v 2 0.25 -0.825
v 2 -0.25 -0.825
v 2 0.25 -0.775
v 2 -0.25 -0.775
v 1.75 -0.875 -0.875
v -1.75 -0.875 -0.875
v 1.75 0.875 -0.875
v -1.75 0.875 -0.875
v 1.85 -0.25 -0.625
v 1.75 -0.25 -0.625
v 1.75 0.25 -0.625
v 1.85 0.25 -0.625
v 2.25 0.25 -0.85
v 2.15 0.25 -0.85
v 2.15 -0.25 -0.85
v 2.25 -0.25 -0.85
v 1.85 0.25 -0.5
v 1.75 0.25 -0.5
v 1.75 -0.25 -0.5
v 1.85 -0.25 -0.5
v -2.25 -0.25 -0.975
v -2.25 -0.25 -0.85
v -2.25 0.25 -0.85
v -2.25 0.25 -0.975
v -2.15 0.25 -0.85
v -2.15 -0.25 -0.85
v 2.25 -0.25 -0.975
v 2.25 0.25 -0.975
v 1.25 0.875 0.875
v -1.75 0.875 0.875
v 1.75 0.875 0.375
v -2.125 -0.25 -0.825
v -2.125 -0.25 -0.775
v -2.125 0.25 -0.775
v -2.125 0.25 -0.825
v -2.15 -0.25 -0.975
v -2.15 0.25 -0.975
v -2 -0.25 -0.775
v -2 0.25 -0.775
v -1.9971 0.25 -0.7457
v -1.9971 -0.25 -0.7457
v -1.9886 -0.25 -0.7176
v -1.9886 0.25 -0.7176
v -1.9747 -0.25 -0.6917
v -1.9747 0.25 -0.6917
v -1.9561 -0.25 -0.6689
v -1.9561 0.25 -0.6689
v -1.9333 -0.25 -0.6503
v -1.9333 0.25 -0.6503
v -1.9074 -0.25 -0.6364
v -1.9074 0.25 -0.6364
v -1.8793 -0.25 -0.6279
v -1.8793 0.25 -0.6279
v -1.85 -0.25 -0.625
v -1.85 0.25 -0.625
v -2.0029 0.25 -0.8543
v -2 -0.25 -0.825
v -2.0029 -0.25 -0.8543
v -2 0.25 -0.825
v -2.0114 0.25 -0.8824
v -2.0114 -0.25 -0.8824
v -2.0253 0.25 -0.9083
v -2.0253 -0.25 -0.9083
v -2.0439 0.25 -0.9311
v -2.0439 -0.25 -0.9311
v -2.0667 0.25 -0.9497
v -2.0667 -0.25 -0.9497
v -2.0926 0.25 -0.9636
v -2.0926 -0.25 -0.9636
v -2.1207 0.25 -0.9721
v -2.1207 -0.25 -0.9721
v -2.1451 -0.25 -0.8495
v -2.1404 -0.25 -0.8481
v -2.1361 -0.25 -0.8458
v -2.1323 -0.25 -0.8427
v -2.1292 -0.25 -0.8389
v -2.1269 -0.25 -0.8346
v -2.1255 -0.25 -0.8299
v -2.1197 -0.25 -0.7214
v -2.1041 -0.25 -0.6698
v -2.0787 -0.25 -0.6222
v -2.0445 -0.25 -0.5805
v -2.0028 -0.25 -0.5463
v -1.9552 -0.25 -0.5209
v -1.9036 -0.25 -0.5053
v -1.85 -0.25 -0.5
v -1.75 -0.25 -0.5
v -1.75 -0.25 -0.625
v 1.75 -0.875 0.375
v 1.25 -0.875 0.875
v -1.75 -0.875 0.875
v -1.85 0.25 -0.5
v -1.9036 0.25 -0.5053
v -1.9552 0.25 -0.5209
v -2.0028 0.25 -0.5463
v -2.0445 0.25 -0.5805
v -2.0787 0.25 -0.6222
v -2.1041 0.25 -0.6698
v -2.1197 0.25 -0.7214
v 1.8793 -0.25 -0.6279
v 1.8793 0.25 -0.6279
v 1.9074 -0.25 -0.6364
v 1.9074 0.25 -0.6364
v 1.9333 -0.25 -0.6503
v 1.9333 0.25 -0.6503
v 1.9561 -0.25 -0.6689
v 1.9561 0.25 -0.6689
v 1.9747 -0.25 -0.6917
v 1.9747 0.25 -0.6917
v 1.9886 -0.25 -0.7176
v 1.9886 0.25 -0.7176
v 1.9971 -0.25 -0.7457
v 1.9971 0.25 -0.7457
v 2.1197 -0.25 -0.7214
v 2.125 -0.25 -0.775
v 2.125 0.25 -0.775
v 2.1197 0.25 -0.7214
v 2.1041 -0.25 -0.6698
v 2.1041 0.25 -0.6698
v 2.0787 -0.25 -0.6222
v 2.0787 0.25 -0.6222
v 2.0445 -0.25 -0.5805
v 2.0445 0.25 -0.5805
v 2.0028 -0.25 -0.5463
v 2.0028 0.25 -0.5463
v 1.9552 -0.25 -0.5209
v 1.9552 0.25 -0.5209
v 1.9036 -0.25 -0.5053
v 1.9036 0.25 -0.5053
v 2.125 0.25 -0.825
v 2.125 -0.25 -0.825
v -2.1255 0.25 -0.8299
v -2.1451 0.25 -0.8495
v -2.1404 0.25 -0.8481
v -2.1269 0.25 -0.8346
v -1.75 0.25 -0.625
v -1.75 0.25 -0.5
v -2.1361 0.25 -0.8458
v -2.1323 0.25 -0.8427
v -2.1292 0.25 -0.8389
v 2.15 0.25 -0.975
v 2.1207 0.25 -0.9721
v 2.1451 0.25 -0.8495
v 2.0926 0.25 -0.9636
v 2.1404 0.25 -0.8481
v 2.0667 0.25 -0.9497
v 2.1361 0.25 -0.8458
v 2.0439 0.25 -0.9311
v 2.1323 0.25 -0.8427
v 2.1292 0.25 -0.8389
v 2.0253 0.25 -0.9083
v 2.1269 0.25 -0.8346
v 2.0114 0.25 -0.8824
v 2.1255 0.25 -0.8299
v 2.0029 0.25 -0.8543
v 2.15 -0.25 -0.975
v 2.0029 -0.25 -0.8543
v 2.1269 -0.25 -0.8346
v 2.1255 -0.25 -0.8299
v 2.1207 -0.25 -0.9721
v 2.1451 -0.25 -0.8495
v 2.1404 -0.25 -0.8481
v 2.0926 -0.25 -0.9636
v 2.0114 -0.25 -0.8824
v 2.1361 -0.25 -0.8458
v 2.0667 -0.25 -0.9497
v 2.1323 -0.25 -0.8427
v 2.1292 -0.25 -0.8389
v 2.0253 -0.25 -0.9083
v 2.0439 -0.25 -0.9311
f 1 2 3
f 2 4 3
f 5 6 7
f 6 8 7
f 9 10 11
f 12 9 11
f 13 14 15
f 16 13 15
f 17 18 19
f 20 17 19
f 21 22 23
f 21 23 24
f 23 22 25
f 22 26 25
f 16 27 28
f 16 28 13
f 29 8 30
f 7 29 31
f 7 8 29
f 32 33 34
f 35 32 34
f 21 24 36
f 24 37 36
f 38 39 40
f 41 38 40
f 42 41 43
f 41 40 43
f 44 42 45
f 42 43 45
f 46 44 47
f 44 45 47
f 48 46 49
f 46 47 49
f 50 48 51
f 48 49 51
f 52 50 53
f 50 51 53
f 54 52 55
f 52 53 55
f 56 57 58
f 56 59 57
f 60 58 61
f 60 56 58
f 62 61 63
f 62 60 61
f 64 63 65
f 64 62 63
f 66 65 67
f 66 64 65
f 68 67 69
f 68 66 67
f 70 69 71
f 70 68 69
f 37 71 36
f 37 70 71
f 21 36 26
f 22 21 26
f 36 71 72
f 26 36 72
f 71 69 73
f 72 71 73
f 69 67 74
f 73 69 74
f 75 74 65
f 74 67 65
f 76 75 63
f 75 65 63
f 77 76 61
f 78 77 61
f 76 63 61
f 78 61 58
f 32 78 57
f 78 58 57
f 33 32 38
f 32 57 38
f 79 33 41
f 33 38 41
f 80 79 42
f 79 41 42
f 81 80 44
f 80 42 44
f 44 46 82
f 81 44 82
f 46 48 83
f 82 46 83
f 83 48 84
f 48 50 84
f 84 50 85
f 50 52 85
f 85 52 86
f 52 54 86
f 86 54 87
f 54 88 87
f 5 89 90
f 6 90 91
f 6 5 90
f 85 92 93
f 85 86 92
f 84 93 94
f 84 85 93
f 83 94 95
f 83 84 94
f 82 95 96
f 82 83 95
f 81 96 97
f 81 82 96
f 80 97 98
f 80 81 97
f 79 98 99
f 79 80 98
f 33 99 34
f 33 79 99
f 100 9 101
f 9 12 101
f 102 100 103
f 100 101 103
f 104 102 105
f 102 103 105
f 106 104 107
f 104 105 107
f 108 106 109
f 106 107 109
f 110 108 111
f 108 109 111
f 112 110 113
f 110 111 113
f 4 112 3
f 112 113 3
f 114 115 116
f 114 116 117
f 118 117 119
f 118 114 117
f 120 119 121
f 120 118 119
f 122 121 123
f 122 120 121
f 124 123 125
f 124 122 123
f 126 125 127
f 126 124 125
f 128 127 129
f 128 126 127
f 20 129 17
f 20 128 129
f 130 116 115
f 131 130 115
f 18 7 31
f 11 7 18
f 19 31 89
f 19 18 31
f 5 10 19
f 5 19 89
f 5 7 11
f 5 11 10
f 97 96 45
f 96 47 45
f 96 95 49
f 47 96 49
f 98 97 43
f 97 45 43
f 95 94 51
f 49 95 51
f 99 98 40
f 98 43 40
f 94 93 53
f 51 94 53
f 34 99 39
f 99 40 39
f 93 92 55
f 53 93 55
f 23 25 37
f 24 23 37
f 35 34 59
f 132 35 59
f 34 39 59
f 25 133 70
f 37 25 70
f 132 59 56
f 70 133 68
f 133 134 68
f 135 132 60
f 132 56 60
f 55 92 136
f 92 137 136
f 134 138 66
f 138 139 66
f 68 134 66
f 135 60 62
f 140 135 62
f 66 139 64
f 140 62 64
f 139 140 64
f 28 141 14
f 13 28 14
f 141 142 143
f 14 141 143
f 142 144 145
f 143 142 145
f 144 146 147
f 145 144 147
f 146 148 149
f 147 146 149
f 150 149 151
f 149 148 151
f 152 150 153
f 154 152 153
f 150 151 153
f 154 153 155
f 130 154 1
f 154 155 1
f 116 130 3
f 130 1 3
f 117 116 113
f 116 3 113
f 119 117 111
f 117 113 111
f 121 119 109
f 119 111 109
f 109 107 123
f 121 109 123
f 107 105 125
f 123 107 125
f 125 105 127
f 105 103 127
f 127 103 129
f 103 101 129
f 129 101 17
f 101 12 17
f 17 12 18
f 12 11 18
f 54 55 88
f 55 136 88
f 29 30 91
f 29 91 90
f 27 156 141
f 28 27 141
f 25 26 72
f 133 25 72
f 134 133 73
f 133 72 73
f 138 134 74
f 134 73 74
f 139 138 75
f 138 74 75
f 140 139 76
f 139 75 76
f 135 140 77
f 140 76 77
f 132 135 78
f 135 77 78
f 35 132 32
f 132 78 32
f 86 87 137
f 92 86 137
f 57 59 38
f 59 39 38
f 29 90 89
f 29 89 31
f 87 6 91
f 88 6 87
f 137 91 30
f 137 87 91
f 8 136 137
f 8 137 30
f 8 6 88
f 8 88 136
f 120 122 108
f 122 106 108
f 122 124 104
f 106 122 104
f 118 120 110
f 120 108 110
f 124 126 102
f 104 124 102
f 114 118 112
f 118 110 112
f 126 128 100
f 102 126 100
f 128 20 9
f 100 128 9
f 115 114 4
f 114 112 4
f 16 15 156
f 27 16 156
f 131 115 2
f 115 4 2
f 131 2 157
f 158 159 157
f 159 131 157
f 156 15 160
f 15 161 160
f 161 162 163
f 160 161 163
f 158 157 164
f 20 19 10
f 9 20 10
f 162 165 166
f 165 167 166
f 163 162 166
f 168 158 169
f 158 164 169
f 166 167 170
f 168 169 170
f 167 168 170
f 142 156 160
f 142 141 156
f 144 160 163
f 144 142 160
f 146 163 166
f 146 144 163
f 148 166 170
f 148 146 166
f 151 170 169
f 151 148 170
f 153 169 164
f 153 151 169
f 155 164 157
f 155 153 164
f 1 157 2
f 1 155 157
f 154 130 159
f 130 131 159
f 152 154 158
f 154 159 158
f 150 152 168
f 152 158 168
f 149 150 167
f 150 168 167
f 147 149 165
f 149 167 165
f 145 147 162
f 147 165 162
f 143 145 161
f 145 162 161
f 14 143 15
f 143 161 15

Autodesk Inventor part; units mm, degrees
ref_plane "YZ Plane" through (0, 0, 0) normal (1, 0, 0) x (0, 1, 0)
ref_plane "XZ Plane" through (0, 0, 0) normal (0, 1, 0) x (-1, 0, 0)
sketch "Sketch1" plane through (0, 0, 0) normal (0, 0, 1) x (1, 0, 0)
  line L0 (-1.75, 0.875) -> (1.75, 0.875)
  line L1 (1.75, 0.875) -> (1.75, -0.875)
  line L2 (1.75, -0.875) -> (-1.75, -0.875)
  line L3 (-1.75, -0.875) -> (-1.75, 0.875)
  line L4 (0, 0) -> (0, 0.875) construction
  line L5 (0, 0) -> (-1.75, 0) construction
  line L6 (0, 0) -> (1.75, 0) construction
  line L7 (0, 0) -> (0, -0.875) construction
  dimension "d0" = 1.75
  dimension "d1" = 3.5
extrude "Extrusion1" add sketch "Sketch1" along normal mid plane 1.75
chamfer "Chamfer1" distance 0.5 angle 45 1 edges at (1.75, 0, 0.875)
sketch "Sketch2" plane through (1.75, -0.875, -0.875) normal (1, 0, 0) x (0, 0, -1)
  line L0 (-1.25, 0) -> (0, 0) projected
  line L1 (0, 0) -> (0, 1.75) projected
  line L2 (-1.25, 1.75) -> (0, 1.75) projected
  line L3 (-0.375, 1.125) -> (-0.25, 1.125)
  line L4 (-0.25, 1.125) -> (-0.25, 0.625)
  line L5 (-0.25, 0.625) -> (-0.375, 0.625)
  line L6 (-0.375, 0.625) -> (-0.375, 1.125)
  line L7 (-0.3125, 1.125) -> (-0.3125, 1.75) construction
  line L8 (-0.3125, 0.625) -> (-0.3125, 0) construction
  dimension "d6" = 0.25
  dimension "d7" = 0.5
  dimension "d8" = 0.125
ref_plane "Work Plane2" through (1.75, -0.25, -0.625) normal (0, 1, 0) x (0, 0, 1)
sketch "Sketch4" plane through (1.75, -0.25, -0.625) normal (0, 1, 0) x (0, 0, 1)
  line L0 (0, 0) -> (0.125, 0) projected
  line L1 (0, 0) -> (0, 0.1)
  line L2 (-0.15, 0.25) -> (-0.2, 0.25)
  line L3 (-0.35, 0.4) -> (-0.35, 0.5)
  arc A0 (0, 0.1) -> (-0.15, 0.25) centre (-0.15, 0.1) ccw
  arc A1 (-0.35, 0.4) -> (-0.2, 0.25) centre (-0.2, 0.4) ccw
  point P0 (0, 0.25)
  point P1 (-0.35, 0.25)
  dimension "d11" = 0.25
  dimension "d12" = 0.25
  dimension "d13" = 0.35
  dimension "d14" = 0.15
sweep "Sweep1" add profiles "Sketch2" path "Sketch4"
mirror "Mirror1" about plane through (0, 0, 0) normal (1, 0, 0) of "Sweep1"
properties part number "Cap1 SMT" material "Delrin, White"
